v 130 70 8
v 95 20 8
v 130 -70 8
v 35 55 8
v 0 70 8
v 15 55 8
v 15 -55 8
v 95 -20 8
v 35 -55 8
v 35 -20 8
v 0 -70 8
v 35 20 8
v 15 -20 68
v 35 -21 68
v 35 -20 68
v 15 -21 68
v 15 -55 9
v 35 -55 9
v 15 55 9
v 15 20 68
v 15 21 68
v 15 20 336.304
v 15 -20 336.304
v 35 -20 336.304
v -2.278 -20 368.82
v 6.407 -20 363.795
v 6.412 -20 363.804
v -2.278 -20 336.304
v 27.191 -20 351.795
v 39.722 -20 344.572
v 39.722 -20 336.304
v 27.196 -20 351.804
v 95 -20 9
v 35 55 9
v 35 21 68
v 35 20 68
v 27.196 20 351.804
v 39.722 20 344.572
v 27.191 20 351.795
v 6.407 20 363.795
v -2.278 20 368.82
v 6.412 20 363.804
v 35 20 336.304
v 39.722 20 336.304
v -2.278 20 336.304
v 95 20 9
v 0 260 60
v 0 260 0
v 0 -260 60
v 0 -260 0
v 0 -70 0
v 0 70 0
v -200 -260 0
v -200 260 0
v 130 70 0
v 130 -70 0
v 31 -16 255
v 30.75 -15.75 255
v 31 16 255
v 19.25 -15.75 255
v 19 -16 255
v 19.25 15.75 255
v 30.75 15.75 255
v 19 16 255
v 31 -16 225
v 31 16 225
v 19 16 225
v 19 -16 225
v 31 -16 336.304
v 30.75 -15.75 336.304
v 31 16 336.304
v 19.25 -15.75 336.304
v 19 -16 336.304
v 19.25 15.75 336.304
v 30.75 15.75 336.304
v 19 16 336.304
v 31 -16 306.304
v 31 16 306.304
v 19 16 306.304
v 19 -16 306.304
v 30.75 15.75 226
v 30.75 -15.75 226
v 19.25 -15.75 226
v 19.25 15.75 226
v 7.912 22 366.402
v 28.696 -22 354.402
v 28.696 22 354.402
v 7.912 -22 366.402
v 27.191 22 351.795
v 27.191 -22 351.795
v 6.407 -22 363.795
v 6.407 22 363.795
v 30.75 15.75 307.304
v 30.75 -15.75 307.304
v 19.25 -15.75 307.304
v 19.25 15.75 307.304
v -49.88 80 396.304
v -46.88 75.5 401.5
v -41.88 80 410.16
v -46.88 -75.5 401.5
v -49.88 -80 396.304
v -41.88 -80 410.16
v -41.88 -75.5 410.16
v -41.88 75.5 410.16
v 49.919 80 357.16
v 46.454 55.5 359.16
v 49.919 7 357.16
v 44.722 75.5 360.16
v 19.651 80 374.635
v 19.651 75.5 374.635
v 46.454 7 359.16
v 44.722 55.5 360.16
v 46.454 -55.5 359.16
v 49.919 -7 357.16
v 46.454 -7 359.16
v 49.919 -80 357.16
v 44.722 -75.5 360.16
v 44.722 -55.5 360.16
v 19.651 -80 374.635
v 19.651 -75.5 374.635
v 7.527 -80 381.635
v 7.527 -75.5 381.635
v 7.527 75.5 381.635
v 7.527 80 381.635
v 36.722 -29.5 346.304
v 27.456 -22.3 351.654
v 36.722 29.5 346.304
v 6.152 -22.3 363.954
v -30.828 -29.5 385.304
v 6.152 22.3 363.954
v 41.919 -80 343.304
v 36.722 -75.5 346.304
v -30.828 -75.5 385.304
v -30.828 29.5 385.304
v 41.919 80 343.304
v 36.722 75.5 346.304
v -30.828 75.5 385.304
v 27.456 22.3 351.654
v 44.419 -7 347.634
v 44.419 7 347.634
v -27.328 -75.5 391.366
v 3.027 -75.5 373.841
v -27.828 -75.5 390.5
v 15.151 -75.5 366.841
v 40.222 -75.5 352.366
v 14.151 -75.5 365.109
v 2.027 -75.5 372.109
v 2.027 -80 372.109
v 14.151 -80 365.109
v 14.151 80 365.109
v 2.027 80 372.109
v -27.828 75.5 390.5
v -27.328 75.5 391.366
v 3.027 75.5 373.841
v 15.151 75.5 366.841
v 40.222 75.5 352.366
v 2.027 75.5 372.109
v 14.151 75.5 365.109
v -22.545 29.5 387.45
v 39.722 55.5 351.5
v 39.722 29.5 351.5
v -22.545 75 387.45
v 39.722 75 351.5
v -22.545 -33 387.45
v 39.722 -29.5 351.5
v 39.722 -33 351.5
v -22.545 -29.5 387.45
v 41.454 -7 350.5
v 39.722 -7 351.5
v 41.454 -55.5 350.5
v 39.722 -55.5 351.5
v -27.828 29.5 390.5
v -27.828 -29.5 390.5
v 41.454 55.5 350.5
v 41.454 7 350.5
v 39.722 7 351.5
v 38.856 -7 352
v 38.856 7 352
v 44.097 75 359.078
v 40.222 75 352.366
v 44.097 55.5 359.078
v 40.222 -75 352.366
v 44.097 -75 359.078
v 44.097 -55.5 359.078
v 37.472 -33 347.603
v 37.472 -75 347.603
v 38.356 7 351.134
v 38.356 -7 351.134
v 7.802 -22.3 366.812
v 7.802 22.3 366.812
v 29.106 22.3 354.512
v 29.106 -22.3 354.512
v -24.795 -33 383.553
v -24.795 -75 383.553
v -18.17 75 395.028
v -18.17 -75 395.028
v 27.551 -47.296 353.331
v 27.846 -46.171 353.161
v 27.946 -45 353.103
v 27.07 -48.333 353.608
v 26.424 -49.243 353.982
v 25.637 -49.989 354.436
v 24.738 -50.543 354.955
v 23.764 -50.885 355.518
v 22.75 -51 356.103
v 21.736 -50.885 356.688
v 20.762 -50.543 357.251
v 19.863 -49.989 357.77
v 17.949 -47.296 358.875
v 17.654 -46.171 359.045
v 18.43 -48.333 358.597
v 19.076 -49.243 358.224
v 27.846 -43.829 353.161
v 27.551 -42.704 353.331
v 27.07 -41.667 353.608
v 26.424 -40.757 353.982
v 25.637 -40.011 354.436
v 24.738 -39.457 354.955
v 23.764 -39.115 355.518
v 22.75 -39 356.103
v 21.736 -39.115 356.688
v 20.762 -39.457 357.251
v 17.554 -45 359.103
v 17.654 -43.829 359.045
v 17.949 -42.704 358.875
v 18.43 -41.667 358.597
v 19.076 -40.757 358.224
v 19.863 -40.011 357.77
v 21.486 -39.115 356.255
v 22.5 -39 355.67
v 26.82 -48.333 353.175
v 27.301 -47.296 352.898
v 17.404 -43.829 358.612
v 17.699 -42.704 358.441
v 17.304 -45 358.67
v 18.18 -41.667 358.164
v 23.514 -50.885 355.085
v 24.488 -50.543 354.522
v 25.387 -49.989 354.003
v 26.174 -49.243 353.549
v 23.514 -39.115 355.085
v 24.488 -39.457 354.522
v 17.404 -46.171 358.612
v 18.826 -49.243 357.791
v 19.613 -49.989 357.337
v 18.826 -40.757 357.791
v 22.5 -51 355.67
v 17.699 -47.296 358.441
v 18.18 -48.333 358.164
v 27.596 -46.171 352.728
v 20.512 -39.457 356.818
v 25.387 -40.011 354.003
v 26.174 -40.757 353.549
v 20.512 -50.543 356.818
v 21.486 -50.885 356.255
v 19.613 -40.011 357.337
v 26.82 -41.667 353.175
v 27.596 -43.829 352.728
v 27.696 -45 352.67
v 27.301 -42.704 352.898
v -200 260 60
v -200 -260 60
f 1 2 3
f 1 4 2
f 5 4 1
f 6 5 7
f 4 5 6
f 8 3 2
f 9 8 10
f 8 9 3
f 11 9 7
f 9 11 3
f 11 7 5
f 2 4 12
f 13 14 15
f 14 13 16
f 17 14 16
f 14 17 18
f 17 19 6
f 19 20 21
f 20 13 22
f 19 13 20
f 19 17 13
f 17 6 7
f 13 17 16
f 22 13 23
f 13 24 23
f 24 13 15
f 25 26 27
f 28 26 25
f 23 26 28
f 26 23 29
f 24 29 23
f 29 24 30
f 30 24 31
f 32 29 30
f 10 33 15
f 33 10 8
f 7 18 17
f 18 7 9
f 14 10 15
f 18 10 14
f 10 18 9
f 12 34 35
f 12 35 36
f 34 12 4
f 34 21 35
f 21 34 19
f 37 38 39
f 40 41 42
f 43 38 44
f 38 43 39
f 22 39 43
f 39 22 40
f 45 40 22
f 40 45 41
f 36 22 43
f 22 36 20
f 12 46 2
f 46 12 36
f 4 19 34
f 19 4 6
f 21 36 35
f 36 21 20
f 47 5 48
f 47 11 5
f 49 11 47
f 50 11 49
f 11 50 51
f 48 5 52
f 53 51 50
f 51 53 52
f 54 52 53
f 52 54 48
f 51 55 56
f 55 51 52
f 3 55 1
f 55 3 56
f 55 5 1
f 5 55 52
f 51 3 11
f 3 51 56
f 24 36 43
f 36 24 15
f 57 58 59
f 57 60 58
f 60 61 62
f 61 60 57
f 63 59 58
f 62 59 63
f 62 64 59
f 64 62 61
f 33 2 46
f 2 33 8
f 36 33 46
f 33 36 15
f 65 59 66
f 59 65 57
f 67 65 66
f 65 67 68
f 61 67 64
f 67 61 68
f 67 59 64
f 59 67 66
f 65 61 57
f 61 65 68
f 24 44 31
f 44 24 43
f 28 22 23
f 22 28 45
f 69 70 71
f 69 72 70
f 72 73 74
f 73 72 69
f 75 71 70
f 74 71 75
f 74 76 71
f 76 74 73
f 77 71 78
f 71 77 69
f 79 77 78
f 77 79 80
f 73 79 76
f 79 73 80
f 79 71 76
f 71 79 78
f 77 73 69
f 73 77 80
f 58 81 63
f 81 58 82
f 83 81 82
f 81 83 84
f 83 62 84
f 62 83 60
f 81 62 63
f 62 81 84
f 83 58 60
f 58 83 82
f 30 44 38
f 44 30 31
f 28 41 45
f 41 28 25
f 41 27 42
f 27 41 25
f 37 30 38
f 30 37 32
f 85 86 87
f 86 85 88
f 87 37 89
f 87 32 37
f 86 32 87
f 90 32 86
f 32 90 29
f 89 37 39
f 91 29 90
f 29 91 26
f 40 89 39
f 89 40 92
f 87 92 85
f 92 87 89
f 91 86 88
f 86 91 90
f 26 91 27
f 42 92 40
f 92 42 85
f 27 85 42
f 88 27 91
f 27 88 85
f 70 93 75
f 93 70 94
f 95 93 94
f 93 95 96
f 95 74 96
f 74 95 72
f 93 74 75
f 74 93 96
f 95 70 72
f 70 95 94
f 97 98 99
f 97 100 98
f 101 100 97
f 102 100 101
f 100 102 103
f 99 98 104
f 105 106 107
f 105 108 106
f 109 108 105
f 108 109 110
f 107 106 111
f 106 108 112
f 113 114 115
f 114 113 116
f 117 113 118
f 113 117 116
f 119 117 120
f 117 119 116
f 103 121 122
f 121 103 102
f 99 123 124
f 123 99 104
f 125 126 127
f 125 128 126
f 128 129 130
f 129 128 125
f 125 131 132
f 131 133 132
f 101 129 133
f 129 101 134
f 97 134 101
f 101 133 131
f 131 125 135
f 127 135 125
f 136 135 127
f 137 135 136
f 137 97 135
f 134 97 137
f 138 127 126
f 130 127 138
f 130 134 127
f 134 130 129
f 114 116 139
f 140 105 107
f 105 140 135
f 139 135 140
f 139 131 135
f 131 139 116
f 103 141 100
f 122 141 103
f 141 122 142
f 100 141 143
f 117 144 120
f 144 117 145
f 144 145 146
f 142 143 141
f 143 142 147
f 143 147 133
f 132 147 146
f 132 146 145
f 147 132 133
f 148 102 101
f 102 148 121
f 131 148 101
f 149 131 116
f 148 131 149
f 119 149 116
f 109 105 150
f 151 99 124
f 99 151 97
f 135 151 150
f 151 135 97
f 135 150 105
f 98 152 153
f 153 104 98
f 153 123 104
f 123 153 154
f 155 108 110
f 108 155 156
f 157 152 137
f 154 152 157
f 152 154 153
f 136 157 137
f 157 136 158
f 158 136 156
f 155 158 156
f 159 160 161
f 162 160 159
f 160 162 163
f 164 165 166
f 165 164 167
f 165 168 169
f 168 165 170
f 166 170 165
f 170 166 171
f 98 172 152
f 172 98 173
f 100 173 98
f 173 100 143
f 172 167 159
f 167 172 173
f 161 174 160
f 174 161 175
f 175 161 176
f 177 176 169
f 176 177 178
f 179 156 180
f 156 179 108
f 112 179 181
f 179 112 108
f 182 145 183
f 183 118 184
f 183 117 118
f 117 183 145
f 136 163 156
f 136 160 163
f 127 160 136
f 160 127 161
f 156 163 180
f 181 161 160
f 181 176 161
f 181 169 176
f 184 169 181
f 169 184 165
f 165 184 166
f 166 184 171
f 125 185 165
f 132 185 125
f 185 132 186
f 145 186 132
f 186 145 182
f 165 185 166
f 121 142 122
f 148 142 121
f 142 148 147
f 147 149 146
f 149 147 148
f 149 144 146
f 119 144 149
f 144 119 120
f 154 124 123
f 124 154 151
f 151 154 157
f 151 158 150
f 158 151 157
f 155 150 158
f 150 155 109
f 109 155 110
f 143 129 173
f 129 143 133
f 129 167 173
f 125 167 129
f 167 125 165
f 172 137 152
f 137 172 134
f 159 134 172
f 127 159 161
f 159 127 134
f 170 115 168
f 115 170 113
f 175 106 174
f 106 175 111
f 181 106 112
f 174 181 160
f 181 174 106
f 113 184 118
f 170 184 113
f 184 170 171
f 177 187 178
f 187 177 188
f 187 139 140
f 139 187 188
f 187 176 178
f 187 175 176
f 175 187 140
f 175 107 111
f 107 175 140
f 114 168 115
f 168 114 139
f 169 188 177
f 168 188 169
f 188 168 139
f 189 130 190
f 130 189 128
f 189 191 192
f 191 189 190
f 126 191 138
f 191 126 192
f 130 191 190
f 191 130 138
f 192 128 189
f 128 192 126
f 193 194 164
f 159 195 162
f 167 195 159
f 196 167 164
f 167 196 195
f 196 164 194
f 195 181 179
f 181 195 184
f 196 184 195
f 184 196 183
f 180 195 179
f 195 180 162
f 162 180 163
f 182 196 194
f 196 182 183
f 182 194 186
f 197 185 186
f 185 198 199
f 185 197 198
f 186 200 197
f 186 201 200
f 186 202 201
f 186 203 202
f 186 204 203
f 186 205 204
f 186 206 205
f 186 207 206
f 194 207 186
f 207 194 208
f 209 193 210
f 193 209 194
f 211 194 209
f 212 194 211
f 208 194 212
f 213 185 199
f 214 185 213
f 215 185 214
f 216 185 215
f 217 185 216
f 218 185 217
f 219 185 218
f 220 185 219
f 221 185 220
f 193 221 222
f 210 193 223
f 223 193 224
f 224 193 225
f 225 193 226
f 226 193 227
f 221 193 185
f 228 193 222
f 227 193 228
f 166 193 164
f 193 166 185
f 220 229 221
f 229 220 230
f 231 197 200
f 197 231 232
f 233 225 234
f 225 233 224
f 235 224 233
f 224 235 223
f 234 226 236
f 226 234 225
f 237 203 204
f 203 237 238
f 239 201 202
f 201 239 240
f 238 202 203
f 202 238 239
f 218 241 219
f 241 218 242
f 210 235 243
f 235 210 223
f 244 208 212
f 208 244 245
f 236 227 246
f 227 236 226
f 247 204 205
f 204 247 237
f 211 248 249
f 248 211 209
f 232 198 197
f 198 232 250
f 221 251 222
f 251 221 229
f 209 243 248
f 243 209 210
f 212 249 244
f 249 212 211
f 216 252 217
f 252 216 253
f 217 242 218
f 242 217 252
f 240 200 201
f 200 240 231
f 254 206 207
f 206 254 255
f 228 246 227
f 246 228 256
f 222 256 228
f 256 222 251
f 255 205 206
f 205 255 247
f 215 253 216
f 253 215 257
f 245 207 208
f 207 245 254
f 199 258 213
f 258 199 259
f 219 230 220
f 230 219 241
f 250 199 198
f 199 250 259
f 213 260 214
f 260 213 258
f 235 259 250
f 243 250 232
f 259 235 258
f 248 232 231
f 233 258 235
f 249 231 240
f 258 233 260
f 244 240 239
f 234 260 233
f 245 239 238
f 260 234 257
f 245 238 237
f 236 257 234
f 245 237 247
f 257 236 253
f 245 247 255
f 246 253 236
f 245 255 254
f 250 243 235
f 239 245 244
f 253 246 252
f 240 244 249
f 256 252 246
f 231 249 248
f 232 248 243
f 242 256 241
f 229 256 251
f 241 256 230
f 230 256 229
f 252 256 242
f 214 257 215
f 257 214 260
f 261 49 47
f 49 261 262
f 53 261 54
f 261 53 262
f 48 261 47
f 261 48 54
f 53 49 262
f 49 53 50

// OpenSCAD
// file: params.scad
// Generated by geometry.py, do not edit.
phone_l = 150.0;
phone_w = 71.9;
phone_t = 8.75;
plateau_from_top = 42.0;
plateau_protrusion = 4.5;
lens_from_side = 17.0;
lens_from_top = 30.0;
phone_slope = 30.0;
lens_d = 25.0;
lens_h_above_board = 300.0;
board_thickness = 60.0;
// main file
// Kifu phone stand: holds an iPhone 17 Pro beside a goban, ultra-wide lens
// looking down at the board. Geometry comes from geometry.py (params.scad).
//
// World frame: the board's side face is x = 0, the board extends towards -x,
// the stand stands on the table (z = 0) at +x. y runs along the board edge.
//
// Parts (render with -D 'part="..."'):
//   base       tongue under the board + column, printed upright
//   extension  column segment, printed socket end down (only when needed)
//   head       tilted saddle with the tenon, printed lying on its side
//   frame      phone cradle, printed back face down
//   assembly   everything in place, with the phone and the board edge

include <params.scad>

part = "assembly";

// --- Printer ------------------------------------------------------------------
max_print_h = 255;          // Bambu Lab X2D: 256 x 256 x 261

// --- Column and joint ---------------------------------------------------------
col_x = 20;                 // column section along x
col_y = 40;                 // column section along y
socket_x = 12;
socket_y = 32;
socket_depth = 30;
joint_play = 0.25;          // per side, tenon vs socket

// --- Base ---------------------------------------------------------------------
tongue_depth = 80;          // under the board
tongue_w = 120;
tongue_t = 2.4;
base_out = 130;             // outside the board
base_w = 140;
base_t = 8;
gusset_h = 60;

// --- Frame (phone cradle) -----------------------------------------------------
frame_w = 160;              // along the board edge
frame_len = 100;            // along the slope
frame_t = 6;
wall_t = 4.5;               // end walls
rail_h = 10;                // walls and lip rail, above the frame's front face
rail_t = 6;                 // lip rail, along the slope
pad_len = 20;               // lip pads at both ends (button-free zones of the phone)
lip_recess = 2;             // lip set back between the pads
window_w = 46;              // camera plateau window, from each end wall
window_len = 78;            // from the lip up the slope
usb_w = 14;
boss_s = [11, 35];          // head boss along the slope
boss_u = 44;                // head boss across
boss_h = 3;
pocket_play = 0.3;

// --- Derived ------------------------------------------------------------------
phi = phone_slope;                                  // phone plane from horizontal
lens_above_lip = lens_from_side * sin(phi);
lens_z = lens_h_above_board + board_thickness;      // lens above the table
lip_z = lens_z - lens_above_lip;                    // phone's lower edge, frame front
lip_x = lens_d + lens_from_side * cos(phi);
col_cx = lens_d;                                    // column axis under the lens
head_out_x = lip_x;                                 // head spans [head_out_x - head_len, head_out_x]
head_len = 42;
head_clear = 10;                                    // head height at its outer, lowest end
back_z_at_lip = lip_z - frame_t * cos(phi);         // frame back plane, at the lip edge
column_top = back_z_at_lip - head_clear;
base_h = min(column_top, max_print_h);
ext_h = column_top - base_h;

echo(str("lens ", lens_z, " mm above the table, column top ", column_top,
         ", base ", base_h, ", extension ", ext_h));

// Frame local coordinates (s along the slope from the lip, u across, n towards
// the phone) to world.
module at_frame() {
    translate([lip_x, 0, lip_z]) rotate([0, phi, 0]) mirror([1, 0, 0]) children();
}

module socket_cut(z_top) {
    translate([col_cx - socket_x / 2, -socket_y / 2, z_top - socket_depth])
        cube([socket_x, socket_y, socket_depth + 1]);
}

module tenon(z_top) {
    translate([col_cx - socket_x / 2 + joint_play, -socket_y / 2 + joint_play, z_top - socket_depth + 1])
        cube([socket_x - 2 * joint_play, socket_y - 2 * joint_play, socket_depth - 1]);
}

module base() {
    difference() {
        union() {
            // tongue under the board
            translate([-tongue_depth, -tongue_w / 2, 0]) cube([tongue_depth, tongue_w, tongue_t]);
            // outer base plate
            translate([0, -base_w / 2, 0]) cube([base_out, base_w, base_t]);
            // column
            translate([col_cx - col_x / 2, -col_y / 2, 0]) cube([col_x, col_y, base_h]);
            // gusset outwards
            hull() {
                translate([col_cx + col_x / 2 - 1, -col_y / 2, base_t]) cube([1, col_y, gusset_h]);
                translate([col_cx + col_x / 2, -col_y / 2, base_t]) cube([gusset_h, col_y, 1]);
            }
            // gussets sideways
            for (sy = [-1, 1]) hull() {
                translate([col_cx - col_x / 2, sy * col_y / 2 - (sy < 0 ? 1 : 0), base_t]) cube([col_x, 1, gusset_h]);
                translate([col_cx - col_x / 2, sy < 0 ? -col_y / 2 - 35 : col_y / 2, base_t]) cube([col_x, 35, 1]);
            }
        }
        socket_cut(base_h);
    }
}

module extension() {
    union() {
        difference() {
            translate([col_cx - col_x / 2, -col_y / 2, base_h]) cube([col_x, col_y, ext_h]);
            socket_cut(base_h + ext_h);
        }
        tenon(base_h);
    }
}

// Half space below the frame's back plane (local n <= -frame_t), in world.
module below_frame_back() {
    at_frame() translate([-500, -500, -frame_t - 500]) cube([1000, 1000, 500]);
}

module head() {
    union() {
        intersection() {
            translate([head_out_x - head_len, -col_y / 2, column_top]) cube([head_len, col_y, 200]);
            below_frame_back();
        }
        // boss locating the frame
        at_frame() translate([boss_s[0], -boss_u / 2, -frame_t - 0.01])
            cube([boss_s[1] - boss_s[0], boss_u, boss_h + 0.01]);
        tenon(column_top);
    }
}

// Frame in local coordinates: s = x, u = y (centred), n = z.
module frame_local() {
    difference() {
        union() {
            // plate
            translate([0, -frame_w / 2, -frame_t]) cube([frame_len, frame_w, frame_t]);
            // lip rail
            translate([-rail_t, -frame_w / 2, -frame_t]) cube([rail_t, frame_w, frame_t + rail_h]);
            // end walls
            for (sy = [-1, 1])
                translate([-rail_t, sy > 0 ? frame_w / 2 - wall_t : -frame_w / 2, -frame_t])
                    cube([frame_len + rail_t, wall_t, frame_t + rail_h]);
        }
        // lip recess between the pads, so no button is pressed in landscape
        translate([-lip_recess, -frame_w / 2 + wall_t + pad_len, 0])
            cube([lip_recess + 1, frame_w - 2 * (wall_t + pad_len), rail_h + 1]);
        // USB-C notch in the lip (portrait) and in the end walls (landscape)
        translate([-rail_t - 1, -usb_w / 2, -1]) cube([rail_t + 2, usb_w, rail_h + 2]);
        for (sy = [-1, 1])
            translate([(phone_w - usb_w) / 2, sy > 0 ? frame_w / 2 - wall_t - 1 : -frame_w / 2 - 1, -1])
                cube([usb_w, wall_t + 2, rail_h + 2]);
        // camera plateau windows at both ends
        for (sy = [-1, 1])
            translate([0, sy > 0 ? frame_w / 2 - wall_t - window_w : -frame_w / 2 + wall_t, -frame_t - 1])
                cube([window_len, window_w, frame_t + 2]);
        // pocket for the head's boss
        translate([boss_s[0] - pocket_play, -boss_u / 2 - pocket_play, -frame_t - 1])
            cube([boss_s[1] - boss_s[0] + 2 * pocket_play, boss_u + 2 * pocket_play, boss_h + pocket_play + 1]);
    }
}

module frame() { at_frame() frame_local(); }

// Phone in landscape, lens-side long edge on the lip, camera end at -u.
module phone_local() {
    color("DimGray") translate([0, -phone_l / 2, 0]) cube([phone_w, phone_l, phone_t]);
    color("DarkSlateGray") translate([0, -phone_l / 2, -plateau_protrusion])
        cube([phone_w, plateau_from_top, plateau_protrusion]);
    color("Black") translate([lens_from_side, -phone_l / 2 + lens_from_top, -plateau_protrusion - 0.5])
        cylinder(d = 12, h = 1, $fn = 32);
}

module board_edge() {
    color("BurlyWood") translate([-200, -260, 0]) cube([200, 520, board_thickness]);
}

module assembly() {
    color("SteelBlue") base();
    if (ext_h > 0) color("CadetBlue") extension();
    color("DarkOrange") head();
    color("Gold") frame();
    at_frame() phone_local();
    board_edge();
}

if (part == "base") base();
else if (part == "extension") extension();
else if (part == "head") head();
else if (part == "frame") frame_local();
else assembly();
